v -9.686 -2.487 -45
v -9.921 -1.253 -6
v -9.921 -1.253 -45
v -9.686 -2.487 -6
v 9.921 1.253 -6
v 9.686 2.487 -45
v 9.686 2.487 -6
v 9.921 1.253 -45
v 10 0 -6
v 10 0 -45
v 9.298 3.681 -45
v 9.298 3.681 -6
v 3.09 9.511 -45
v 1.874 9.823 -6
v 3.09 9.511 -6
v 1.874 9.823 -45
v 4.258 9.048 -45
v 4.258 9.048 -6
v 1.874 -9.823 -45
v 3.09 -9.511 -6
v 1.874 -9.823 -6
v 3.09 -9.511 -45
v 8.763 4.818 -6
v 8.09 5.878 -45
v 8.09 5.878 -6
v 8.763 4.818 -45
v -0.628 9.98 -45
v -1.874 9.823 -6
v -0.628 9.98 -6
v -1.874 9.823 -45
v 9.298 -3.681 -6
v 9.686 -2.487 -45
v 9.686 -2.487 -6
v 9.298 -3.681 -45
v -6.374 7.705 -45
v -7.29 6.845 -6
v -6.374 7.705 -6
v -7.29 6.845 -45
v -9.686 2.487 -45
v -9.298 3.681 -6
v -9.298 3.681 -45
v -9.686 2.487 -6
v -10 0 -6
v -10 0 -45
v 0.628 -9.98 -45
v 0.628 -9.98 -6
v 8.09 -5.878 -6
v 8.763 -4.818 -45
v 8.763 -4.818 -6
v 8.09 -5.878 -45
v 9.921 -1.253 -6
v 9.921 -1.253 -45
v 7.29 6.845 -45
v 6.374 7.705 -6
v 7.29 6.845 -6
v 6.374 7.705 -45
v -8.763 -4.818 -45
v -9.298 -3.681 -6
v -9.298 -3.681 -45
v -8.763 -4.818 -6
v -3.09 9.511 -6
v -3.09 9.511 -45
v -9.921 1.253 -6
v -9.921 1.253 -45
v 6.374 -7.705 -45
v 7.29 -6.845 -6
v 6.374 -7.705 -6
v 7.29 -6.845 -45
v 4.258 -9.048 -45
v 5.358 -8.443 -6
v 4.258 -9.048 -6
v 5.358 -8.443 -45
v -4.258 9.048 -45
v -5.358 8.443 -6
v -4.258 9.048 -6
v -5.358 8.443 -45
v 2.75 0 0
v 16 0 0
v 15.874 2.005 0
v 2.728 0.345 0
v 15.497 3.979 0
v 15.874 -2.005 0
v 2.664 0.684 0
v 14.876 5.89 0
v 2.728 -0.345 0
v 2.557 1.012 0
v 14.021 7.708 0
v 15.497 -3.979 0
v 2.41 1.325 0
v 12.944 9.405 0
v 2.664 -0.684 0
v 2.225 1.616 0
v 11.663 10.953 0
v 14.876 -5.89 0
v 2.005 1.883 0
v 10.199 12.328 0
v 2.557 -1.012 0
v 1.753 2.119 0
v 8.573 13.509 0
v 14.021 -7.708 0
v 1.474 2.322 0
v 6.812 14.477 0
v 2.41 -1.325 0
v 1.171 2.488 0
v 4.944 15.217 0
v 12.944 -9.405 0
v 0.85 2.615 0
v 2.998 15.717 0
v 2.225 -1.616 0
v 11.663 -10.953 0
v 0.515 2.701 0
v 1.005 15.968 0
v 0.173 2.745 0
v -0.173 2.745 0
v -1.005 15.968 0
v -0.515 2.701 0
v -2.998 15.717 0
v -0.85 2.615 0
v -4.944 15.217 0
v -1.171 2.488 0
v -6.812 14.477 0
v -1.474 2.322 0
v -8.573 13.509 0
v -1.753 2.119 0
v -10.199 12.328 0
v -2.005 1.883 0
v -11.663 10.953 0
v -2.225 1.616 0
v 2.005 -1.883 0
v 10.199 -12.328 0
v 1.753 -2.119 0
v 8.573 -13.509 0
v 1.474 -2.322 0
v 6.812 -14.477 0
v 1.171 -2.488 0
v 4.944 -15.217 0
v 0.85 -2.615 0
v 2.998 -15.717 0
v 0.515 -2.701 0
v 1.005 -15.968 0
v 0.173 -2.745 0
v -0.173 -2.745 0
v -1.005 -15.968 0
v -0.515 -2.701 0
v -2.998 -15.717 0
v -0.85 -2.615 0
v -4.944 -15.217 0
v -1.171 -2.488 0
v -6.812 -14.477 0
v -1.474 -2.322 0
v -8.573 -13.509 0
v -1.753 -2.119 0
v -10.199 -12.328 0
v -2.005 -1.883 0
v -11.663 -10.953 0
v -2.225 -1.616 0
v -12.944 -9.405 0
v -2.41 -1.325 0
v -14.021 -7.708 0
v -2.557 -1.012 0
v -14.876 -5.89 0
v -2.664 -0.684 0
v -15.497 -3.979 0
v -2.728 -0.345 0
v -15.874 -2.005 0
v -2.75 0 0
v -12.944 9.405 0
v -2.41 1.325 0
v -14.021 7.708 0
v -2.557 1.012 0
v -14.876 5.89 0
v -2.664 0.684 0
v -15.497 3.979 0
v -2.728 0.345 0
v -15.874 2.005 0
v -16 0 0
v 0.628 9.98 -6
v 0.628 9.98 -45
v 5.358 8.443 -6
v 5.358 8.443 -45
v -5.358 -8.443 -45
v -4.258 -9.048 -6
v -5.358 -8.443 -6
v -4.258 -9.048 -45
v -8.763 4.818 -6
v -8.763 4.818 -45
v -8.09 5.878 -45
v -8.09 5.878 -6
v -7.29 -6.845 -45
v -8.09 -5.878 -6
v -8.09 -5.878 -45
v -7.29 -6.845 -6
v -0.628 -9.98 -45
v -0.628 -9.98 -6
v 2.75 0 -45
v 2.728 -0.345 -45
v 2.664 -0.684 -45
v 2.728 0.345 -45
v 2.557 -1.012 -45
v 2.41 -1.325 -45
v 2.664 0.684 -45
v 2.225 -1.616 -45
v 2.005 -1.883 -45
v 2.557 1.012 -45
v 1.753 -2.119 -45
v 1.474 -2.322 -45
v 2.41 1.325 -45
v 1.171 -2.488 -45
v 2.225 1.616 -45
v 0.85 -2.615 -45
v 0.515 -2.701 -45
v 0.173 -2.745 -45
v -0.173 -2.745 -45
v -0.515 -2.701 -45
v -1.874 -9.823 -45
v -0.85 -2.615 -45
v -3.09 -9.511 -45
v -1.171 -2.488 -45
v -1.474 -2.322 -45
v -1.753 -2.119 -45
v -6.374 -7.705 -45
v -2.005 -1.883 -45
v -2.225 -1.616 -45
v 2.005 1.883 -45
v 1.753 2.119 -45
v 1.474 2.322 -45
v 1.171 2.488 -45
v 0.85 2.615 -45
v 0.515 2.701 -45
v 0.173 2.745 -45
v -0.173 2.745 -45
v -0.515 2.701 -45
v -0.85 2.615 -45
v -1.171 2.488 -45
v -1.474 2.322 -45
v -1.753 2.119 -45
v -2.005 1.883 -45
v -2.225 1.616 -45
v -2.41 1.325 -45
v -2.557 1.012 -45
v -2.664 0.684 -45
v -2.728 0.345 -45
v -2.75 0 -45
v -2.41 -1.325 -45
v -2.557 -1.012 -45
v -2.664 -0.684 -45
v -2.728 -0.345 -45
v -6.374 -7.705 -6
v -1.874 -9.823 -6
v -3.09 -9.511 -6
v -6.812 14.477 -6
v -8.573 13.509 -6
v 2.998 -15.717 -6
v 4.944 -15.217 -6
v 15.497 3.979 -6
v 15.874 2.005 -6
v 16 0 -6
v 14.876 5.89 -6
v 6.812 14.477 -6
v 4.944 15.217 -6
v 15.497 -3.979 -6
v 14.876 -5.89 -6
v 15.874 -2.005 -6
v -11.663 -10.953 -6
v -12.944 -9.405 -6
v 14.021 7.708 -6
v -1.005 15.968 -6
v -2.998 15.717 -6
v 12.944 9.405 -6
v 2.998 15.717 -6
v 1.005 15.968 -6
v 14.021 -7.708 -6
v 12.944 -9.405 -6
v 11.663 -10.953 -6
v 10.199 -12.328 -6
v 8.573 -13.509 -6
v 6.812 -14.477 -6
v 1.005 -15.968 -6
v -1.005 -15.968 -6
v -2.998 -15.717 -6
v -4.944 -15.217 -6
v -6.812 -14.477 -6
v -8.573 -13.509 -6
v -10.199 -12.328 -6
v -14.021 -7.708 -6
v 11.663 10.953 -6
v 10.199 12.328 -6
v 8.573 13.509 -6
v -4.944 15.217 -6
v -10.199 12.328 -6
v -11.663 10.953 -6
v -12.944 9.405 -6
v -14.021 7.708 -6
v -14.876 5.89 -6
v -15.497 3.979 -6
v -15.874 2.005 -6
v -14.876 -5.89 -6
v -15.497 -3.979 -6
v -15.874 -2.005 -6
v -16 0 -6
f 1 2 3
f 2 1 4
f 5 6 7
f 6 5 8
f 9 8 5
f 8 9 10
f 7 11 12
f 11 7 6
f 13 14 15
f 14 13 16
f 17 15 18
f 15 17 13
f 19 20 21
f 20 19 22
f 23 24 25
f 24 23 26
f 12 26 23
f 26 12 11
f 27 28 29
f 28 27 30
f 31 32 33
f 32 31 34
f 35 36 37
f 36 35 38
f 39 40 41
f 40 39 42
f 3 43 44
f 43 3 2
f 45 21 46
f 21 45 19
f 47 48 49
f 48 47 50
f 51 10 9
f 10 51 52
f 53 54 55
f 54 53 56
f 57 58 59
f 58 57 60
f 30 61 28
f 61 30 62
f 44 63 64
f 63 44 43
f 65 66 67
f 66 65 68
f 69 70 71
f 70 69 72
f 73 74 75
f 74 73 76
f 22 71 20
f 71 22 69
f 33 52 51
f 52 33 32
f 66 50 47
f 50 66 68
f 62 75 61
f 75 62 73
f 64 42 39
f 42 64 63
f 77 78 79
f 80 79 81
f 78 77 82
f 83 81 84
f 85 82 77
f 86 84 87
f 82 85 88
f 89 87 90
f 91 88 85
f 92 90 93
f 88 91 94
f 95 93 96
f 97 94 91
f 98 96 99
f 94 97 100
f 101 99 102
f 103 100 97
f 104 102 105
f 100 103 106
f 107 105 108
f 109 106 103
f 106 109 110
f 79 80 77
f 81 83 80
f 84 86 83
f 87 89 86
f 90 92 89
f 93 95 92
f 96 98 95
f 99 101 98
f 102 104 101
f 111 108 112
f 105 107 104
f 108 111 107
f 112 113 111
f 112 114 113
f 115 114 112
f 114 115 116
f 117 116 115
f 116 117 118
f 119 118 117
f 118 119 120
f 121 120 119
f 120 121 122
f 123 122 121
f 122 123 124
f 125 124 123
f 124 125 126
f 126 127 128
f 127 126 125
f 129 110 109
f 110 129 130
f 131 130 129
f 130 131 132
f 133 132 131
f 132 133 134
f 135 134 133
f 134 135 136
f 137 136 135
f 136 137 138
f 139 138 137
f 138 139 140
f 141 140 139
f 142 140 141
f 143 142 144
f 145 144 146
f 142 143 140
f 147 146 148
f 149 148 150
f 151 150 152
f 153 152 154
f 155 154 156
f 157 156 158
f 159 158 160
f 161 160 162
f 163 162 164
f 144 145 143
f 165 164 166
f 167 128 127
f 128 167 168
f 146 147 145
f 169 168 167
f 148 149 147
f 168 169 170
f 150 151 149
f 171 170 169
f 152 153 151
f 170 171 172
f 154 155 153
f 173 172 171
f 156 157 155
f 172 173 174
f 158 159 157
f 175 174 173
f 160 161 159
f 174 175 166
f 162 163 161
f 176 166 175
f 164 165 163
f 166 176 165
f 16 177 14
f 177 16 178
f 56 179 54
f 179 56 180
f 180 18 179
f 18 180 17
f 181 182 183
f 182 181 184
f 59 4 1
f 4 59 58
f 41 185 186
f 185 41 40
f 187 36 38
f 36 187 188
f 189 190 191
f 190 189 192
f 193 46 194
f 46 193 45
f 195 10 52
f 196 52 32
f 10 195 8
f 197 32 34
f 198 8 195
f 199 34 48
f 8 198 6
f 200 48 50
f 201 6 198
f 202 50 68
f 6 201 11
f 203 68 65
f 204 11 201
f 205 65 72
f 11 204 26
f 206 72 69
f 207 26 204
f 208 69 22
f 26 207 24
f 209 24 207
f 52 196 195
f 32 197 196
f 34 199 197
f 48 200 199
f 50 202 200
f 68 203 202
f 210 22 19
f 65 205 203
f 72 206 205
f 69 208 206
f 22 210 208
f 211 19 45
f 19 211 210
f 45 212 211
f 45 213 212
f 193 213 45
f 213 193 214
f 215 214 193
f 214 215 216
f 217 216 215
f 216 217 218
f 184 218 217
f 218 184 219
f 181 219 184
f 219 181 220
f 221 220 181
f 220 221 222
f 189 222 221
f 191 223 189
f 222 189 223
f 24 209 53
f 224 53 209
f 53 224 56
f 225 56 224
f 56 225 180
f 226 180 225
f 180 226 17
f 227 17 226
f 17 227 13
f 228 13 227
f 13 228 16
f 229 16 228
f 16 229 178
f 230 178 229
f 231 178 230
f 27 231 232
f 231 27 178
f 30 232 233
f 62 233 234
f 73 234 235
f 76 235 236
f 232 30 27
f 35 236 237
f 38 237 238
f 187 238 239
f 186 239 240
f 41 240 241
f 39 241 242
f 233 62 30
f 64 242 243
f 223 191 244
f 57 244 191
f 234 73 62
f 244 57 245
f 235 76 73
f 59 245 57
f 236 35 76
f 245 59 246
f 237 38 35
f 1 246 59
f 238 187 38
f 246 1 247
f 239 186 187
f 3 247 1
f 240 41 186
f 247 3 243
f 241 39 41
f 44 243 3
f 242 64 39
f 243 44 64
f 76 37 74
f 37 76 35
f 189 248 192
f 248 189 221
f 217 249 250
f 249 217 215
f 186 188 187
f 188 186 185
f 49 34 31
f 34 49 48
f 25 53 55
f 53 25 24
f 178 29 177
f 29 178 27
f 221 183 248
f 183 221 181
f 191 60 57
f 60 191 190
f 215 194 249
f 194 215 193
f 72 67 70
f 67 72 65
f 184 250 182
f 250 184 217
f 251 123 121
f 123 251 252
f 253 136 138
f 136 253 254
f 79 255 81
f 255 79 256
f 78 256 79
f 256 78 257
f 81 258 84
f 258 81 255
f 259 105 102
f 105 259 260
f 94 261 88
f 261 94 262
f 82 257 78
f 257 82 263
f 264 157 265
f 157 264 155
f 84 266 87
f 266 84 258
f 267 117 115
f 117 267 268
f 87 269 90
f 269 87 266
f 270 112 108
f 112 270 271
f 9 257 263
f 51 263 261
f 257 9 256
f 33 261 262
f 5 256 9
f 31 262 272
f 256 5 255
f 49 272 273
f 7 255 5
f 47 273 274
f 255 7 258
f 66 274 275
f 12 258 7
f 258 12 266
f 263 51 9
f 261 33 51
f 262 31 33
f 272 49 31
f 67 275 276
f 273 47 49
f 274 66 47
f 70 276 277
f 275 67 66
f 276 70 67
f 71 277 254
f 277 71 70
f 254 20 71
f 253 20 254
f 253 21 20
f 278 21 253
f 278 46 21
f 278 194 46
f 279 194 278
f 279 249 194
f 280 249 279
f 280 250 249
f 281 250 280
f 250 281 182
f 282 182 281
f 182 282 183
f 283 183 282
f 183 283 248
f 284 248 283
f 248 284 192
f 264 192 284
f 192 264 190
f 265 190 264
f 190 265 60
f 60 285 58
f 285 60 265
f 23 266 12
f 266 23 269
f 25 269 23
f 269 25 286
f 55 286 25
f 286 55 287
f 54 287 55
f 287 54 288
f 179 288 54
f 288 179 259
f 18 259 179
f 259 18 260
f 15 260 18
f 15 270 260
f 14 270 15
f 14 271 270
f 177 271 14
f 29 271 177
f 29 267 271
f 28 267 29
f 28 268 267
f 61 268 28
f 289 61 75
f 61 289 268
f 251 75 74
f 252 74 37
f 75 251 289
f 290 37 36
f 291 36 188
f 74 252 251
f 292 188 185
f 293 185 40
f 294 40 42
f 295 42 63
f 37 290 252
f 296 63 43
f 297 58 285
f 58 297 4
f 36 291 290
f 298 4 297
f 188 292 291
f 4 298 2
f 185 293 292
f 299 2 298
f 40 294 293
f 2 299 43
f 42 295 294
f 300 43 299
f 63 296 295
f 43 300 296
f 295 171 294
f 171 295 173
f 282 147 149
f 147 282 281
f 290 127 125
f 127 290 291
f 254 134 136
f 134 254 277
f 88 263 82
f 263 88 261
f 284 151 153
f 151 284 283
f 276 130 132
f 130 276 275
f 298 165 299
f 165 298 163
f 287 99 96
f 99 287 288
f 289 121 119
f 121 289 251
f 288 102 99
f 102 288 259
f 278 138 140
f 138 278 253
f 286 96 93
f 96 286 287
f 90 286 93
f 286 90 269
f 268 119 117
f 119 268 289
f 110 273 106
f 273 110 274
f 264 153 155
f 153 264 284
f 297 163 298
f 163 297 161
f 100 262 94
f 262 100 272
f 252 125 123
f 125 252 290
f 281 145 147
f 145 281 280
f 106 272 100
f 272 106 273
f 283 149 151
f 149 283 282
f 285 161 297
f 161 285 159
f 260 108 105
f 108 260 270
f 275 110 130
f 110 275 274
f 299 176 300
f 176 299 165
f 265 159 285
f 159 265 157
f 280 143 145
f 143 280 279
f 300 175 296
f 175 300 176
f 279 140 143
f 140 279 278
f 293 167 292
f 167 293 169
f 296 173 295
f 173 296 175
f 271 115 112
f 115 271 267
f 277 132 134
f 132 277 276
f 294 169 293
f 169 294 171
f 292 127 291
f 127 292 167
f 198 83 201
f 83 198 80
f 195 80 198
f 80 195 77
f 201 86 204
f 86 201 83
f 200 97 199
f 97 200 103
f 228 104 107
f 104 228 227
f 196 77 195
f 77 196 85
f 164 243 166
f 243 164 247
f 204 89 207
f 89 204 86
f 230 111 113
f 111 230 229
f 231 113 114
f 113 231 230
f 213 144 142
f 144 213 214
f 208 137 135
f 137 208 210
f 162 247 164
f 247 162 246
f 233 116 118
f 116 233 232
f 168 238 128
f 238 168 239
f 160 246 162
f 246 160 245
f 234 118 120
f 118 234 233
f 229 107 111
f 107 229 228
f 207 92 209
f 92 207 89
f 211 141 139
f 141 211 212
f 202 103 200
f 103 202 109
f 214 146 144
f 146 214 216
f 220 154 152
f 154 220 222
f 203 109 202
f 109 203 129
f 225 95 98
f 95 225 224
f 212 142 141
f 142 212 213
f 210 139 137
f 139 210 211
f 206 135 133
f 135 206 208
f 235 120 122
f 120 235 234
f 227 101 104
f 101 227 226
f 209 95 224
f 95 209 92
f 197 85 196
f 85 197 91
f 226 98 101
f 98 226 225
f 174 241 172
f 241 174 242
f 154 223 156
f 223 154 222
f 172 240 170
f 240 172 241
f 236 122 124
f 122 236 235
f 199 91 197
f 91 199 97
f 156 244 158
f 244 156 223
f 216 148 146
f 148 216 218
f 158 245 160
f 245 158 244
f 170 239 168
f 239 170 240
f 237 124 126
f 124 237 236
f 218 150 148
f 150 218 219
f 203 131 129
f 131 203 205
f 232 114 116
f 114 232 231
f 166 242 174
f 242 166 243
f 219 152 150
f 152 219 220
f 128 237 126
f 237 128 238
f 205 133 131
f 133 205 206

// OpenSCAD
$fn = 50;


difference() {
	union() {
		translate(v = [0, 0, -45.0000000000]) {
			cylinder(h = 45, r = 10.0000000000);
		}
		translate(v = [0, 0, -6.0000000000]) {
			cylinder(h = 6, r = 16.0000000000);
		}
	}
	union() {
		#translate(v = [0, 0, -45]) {
			cylinder(h = 45, r = 2.7500000000);
		}
	}
}
